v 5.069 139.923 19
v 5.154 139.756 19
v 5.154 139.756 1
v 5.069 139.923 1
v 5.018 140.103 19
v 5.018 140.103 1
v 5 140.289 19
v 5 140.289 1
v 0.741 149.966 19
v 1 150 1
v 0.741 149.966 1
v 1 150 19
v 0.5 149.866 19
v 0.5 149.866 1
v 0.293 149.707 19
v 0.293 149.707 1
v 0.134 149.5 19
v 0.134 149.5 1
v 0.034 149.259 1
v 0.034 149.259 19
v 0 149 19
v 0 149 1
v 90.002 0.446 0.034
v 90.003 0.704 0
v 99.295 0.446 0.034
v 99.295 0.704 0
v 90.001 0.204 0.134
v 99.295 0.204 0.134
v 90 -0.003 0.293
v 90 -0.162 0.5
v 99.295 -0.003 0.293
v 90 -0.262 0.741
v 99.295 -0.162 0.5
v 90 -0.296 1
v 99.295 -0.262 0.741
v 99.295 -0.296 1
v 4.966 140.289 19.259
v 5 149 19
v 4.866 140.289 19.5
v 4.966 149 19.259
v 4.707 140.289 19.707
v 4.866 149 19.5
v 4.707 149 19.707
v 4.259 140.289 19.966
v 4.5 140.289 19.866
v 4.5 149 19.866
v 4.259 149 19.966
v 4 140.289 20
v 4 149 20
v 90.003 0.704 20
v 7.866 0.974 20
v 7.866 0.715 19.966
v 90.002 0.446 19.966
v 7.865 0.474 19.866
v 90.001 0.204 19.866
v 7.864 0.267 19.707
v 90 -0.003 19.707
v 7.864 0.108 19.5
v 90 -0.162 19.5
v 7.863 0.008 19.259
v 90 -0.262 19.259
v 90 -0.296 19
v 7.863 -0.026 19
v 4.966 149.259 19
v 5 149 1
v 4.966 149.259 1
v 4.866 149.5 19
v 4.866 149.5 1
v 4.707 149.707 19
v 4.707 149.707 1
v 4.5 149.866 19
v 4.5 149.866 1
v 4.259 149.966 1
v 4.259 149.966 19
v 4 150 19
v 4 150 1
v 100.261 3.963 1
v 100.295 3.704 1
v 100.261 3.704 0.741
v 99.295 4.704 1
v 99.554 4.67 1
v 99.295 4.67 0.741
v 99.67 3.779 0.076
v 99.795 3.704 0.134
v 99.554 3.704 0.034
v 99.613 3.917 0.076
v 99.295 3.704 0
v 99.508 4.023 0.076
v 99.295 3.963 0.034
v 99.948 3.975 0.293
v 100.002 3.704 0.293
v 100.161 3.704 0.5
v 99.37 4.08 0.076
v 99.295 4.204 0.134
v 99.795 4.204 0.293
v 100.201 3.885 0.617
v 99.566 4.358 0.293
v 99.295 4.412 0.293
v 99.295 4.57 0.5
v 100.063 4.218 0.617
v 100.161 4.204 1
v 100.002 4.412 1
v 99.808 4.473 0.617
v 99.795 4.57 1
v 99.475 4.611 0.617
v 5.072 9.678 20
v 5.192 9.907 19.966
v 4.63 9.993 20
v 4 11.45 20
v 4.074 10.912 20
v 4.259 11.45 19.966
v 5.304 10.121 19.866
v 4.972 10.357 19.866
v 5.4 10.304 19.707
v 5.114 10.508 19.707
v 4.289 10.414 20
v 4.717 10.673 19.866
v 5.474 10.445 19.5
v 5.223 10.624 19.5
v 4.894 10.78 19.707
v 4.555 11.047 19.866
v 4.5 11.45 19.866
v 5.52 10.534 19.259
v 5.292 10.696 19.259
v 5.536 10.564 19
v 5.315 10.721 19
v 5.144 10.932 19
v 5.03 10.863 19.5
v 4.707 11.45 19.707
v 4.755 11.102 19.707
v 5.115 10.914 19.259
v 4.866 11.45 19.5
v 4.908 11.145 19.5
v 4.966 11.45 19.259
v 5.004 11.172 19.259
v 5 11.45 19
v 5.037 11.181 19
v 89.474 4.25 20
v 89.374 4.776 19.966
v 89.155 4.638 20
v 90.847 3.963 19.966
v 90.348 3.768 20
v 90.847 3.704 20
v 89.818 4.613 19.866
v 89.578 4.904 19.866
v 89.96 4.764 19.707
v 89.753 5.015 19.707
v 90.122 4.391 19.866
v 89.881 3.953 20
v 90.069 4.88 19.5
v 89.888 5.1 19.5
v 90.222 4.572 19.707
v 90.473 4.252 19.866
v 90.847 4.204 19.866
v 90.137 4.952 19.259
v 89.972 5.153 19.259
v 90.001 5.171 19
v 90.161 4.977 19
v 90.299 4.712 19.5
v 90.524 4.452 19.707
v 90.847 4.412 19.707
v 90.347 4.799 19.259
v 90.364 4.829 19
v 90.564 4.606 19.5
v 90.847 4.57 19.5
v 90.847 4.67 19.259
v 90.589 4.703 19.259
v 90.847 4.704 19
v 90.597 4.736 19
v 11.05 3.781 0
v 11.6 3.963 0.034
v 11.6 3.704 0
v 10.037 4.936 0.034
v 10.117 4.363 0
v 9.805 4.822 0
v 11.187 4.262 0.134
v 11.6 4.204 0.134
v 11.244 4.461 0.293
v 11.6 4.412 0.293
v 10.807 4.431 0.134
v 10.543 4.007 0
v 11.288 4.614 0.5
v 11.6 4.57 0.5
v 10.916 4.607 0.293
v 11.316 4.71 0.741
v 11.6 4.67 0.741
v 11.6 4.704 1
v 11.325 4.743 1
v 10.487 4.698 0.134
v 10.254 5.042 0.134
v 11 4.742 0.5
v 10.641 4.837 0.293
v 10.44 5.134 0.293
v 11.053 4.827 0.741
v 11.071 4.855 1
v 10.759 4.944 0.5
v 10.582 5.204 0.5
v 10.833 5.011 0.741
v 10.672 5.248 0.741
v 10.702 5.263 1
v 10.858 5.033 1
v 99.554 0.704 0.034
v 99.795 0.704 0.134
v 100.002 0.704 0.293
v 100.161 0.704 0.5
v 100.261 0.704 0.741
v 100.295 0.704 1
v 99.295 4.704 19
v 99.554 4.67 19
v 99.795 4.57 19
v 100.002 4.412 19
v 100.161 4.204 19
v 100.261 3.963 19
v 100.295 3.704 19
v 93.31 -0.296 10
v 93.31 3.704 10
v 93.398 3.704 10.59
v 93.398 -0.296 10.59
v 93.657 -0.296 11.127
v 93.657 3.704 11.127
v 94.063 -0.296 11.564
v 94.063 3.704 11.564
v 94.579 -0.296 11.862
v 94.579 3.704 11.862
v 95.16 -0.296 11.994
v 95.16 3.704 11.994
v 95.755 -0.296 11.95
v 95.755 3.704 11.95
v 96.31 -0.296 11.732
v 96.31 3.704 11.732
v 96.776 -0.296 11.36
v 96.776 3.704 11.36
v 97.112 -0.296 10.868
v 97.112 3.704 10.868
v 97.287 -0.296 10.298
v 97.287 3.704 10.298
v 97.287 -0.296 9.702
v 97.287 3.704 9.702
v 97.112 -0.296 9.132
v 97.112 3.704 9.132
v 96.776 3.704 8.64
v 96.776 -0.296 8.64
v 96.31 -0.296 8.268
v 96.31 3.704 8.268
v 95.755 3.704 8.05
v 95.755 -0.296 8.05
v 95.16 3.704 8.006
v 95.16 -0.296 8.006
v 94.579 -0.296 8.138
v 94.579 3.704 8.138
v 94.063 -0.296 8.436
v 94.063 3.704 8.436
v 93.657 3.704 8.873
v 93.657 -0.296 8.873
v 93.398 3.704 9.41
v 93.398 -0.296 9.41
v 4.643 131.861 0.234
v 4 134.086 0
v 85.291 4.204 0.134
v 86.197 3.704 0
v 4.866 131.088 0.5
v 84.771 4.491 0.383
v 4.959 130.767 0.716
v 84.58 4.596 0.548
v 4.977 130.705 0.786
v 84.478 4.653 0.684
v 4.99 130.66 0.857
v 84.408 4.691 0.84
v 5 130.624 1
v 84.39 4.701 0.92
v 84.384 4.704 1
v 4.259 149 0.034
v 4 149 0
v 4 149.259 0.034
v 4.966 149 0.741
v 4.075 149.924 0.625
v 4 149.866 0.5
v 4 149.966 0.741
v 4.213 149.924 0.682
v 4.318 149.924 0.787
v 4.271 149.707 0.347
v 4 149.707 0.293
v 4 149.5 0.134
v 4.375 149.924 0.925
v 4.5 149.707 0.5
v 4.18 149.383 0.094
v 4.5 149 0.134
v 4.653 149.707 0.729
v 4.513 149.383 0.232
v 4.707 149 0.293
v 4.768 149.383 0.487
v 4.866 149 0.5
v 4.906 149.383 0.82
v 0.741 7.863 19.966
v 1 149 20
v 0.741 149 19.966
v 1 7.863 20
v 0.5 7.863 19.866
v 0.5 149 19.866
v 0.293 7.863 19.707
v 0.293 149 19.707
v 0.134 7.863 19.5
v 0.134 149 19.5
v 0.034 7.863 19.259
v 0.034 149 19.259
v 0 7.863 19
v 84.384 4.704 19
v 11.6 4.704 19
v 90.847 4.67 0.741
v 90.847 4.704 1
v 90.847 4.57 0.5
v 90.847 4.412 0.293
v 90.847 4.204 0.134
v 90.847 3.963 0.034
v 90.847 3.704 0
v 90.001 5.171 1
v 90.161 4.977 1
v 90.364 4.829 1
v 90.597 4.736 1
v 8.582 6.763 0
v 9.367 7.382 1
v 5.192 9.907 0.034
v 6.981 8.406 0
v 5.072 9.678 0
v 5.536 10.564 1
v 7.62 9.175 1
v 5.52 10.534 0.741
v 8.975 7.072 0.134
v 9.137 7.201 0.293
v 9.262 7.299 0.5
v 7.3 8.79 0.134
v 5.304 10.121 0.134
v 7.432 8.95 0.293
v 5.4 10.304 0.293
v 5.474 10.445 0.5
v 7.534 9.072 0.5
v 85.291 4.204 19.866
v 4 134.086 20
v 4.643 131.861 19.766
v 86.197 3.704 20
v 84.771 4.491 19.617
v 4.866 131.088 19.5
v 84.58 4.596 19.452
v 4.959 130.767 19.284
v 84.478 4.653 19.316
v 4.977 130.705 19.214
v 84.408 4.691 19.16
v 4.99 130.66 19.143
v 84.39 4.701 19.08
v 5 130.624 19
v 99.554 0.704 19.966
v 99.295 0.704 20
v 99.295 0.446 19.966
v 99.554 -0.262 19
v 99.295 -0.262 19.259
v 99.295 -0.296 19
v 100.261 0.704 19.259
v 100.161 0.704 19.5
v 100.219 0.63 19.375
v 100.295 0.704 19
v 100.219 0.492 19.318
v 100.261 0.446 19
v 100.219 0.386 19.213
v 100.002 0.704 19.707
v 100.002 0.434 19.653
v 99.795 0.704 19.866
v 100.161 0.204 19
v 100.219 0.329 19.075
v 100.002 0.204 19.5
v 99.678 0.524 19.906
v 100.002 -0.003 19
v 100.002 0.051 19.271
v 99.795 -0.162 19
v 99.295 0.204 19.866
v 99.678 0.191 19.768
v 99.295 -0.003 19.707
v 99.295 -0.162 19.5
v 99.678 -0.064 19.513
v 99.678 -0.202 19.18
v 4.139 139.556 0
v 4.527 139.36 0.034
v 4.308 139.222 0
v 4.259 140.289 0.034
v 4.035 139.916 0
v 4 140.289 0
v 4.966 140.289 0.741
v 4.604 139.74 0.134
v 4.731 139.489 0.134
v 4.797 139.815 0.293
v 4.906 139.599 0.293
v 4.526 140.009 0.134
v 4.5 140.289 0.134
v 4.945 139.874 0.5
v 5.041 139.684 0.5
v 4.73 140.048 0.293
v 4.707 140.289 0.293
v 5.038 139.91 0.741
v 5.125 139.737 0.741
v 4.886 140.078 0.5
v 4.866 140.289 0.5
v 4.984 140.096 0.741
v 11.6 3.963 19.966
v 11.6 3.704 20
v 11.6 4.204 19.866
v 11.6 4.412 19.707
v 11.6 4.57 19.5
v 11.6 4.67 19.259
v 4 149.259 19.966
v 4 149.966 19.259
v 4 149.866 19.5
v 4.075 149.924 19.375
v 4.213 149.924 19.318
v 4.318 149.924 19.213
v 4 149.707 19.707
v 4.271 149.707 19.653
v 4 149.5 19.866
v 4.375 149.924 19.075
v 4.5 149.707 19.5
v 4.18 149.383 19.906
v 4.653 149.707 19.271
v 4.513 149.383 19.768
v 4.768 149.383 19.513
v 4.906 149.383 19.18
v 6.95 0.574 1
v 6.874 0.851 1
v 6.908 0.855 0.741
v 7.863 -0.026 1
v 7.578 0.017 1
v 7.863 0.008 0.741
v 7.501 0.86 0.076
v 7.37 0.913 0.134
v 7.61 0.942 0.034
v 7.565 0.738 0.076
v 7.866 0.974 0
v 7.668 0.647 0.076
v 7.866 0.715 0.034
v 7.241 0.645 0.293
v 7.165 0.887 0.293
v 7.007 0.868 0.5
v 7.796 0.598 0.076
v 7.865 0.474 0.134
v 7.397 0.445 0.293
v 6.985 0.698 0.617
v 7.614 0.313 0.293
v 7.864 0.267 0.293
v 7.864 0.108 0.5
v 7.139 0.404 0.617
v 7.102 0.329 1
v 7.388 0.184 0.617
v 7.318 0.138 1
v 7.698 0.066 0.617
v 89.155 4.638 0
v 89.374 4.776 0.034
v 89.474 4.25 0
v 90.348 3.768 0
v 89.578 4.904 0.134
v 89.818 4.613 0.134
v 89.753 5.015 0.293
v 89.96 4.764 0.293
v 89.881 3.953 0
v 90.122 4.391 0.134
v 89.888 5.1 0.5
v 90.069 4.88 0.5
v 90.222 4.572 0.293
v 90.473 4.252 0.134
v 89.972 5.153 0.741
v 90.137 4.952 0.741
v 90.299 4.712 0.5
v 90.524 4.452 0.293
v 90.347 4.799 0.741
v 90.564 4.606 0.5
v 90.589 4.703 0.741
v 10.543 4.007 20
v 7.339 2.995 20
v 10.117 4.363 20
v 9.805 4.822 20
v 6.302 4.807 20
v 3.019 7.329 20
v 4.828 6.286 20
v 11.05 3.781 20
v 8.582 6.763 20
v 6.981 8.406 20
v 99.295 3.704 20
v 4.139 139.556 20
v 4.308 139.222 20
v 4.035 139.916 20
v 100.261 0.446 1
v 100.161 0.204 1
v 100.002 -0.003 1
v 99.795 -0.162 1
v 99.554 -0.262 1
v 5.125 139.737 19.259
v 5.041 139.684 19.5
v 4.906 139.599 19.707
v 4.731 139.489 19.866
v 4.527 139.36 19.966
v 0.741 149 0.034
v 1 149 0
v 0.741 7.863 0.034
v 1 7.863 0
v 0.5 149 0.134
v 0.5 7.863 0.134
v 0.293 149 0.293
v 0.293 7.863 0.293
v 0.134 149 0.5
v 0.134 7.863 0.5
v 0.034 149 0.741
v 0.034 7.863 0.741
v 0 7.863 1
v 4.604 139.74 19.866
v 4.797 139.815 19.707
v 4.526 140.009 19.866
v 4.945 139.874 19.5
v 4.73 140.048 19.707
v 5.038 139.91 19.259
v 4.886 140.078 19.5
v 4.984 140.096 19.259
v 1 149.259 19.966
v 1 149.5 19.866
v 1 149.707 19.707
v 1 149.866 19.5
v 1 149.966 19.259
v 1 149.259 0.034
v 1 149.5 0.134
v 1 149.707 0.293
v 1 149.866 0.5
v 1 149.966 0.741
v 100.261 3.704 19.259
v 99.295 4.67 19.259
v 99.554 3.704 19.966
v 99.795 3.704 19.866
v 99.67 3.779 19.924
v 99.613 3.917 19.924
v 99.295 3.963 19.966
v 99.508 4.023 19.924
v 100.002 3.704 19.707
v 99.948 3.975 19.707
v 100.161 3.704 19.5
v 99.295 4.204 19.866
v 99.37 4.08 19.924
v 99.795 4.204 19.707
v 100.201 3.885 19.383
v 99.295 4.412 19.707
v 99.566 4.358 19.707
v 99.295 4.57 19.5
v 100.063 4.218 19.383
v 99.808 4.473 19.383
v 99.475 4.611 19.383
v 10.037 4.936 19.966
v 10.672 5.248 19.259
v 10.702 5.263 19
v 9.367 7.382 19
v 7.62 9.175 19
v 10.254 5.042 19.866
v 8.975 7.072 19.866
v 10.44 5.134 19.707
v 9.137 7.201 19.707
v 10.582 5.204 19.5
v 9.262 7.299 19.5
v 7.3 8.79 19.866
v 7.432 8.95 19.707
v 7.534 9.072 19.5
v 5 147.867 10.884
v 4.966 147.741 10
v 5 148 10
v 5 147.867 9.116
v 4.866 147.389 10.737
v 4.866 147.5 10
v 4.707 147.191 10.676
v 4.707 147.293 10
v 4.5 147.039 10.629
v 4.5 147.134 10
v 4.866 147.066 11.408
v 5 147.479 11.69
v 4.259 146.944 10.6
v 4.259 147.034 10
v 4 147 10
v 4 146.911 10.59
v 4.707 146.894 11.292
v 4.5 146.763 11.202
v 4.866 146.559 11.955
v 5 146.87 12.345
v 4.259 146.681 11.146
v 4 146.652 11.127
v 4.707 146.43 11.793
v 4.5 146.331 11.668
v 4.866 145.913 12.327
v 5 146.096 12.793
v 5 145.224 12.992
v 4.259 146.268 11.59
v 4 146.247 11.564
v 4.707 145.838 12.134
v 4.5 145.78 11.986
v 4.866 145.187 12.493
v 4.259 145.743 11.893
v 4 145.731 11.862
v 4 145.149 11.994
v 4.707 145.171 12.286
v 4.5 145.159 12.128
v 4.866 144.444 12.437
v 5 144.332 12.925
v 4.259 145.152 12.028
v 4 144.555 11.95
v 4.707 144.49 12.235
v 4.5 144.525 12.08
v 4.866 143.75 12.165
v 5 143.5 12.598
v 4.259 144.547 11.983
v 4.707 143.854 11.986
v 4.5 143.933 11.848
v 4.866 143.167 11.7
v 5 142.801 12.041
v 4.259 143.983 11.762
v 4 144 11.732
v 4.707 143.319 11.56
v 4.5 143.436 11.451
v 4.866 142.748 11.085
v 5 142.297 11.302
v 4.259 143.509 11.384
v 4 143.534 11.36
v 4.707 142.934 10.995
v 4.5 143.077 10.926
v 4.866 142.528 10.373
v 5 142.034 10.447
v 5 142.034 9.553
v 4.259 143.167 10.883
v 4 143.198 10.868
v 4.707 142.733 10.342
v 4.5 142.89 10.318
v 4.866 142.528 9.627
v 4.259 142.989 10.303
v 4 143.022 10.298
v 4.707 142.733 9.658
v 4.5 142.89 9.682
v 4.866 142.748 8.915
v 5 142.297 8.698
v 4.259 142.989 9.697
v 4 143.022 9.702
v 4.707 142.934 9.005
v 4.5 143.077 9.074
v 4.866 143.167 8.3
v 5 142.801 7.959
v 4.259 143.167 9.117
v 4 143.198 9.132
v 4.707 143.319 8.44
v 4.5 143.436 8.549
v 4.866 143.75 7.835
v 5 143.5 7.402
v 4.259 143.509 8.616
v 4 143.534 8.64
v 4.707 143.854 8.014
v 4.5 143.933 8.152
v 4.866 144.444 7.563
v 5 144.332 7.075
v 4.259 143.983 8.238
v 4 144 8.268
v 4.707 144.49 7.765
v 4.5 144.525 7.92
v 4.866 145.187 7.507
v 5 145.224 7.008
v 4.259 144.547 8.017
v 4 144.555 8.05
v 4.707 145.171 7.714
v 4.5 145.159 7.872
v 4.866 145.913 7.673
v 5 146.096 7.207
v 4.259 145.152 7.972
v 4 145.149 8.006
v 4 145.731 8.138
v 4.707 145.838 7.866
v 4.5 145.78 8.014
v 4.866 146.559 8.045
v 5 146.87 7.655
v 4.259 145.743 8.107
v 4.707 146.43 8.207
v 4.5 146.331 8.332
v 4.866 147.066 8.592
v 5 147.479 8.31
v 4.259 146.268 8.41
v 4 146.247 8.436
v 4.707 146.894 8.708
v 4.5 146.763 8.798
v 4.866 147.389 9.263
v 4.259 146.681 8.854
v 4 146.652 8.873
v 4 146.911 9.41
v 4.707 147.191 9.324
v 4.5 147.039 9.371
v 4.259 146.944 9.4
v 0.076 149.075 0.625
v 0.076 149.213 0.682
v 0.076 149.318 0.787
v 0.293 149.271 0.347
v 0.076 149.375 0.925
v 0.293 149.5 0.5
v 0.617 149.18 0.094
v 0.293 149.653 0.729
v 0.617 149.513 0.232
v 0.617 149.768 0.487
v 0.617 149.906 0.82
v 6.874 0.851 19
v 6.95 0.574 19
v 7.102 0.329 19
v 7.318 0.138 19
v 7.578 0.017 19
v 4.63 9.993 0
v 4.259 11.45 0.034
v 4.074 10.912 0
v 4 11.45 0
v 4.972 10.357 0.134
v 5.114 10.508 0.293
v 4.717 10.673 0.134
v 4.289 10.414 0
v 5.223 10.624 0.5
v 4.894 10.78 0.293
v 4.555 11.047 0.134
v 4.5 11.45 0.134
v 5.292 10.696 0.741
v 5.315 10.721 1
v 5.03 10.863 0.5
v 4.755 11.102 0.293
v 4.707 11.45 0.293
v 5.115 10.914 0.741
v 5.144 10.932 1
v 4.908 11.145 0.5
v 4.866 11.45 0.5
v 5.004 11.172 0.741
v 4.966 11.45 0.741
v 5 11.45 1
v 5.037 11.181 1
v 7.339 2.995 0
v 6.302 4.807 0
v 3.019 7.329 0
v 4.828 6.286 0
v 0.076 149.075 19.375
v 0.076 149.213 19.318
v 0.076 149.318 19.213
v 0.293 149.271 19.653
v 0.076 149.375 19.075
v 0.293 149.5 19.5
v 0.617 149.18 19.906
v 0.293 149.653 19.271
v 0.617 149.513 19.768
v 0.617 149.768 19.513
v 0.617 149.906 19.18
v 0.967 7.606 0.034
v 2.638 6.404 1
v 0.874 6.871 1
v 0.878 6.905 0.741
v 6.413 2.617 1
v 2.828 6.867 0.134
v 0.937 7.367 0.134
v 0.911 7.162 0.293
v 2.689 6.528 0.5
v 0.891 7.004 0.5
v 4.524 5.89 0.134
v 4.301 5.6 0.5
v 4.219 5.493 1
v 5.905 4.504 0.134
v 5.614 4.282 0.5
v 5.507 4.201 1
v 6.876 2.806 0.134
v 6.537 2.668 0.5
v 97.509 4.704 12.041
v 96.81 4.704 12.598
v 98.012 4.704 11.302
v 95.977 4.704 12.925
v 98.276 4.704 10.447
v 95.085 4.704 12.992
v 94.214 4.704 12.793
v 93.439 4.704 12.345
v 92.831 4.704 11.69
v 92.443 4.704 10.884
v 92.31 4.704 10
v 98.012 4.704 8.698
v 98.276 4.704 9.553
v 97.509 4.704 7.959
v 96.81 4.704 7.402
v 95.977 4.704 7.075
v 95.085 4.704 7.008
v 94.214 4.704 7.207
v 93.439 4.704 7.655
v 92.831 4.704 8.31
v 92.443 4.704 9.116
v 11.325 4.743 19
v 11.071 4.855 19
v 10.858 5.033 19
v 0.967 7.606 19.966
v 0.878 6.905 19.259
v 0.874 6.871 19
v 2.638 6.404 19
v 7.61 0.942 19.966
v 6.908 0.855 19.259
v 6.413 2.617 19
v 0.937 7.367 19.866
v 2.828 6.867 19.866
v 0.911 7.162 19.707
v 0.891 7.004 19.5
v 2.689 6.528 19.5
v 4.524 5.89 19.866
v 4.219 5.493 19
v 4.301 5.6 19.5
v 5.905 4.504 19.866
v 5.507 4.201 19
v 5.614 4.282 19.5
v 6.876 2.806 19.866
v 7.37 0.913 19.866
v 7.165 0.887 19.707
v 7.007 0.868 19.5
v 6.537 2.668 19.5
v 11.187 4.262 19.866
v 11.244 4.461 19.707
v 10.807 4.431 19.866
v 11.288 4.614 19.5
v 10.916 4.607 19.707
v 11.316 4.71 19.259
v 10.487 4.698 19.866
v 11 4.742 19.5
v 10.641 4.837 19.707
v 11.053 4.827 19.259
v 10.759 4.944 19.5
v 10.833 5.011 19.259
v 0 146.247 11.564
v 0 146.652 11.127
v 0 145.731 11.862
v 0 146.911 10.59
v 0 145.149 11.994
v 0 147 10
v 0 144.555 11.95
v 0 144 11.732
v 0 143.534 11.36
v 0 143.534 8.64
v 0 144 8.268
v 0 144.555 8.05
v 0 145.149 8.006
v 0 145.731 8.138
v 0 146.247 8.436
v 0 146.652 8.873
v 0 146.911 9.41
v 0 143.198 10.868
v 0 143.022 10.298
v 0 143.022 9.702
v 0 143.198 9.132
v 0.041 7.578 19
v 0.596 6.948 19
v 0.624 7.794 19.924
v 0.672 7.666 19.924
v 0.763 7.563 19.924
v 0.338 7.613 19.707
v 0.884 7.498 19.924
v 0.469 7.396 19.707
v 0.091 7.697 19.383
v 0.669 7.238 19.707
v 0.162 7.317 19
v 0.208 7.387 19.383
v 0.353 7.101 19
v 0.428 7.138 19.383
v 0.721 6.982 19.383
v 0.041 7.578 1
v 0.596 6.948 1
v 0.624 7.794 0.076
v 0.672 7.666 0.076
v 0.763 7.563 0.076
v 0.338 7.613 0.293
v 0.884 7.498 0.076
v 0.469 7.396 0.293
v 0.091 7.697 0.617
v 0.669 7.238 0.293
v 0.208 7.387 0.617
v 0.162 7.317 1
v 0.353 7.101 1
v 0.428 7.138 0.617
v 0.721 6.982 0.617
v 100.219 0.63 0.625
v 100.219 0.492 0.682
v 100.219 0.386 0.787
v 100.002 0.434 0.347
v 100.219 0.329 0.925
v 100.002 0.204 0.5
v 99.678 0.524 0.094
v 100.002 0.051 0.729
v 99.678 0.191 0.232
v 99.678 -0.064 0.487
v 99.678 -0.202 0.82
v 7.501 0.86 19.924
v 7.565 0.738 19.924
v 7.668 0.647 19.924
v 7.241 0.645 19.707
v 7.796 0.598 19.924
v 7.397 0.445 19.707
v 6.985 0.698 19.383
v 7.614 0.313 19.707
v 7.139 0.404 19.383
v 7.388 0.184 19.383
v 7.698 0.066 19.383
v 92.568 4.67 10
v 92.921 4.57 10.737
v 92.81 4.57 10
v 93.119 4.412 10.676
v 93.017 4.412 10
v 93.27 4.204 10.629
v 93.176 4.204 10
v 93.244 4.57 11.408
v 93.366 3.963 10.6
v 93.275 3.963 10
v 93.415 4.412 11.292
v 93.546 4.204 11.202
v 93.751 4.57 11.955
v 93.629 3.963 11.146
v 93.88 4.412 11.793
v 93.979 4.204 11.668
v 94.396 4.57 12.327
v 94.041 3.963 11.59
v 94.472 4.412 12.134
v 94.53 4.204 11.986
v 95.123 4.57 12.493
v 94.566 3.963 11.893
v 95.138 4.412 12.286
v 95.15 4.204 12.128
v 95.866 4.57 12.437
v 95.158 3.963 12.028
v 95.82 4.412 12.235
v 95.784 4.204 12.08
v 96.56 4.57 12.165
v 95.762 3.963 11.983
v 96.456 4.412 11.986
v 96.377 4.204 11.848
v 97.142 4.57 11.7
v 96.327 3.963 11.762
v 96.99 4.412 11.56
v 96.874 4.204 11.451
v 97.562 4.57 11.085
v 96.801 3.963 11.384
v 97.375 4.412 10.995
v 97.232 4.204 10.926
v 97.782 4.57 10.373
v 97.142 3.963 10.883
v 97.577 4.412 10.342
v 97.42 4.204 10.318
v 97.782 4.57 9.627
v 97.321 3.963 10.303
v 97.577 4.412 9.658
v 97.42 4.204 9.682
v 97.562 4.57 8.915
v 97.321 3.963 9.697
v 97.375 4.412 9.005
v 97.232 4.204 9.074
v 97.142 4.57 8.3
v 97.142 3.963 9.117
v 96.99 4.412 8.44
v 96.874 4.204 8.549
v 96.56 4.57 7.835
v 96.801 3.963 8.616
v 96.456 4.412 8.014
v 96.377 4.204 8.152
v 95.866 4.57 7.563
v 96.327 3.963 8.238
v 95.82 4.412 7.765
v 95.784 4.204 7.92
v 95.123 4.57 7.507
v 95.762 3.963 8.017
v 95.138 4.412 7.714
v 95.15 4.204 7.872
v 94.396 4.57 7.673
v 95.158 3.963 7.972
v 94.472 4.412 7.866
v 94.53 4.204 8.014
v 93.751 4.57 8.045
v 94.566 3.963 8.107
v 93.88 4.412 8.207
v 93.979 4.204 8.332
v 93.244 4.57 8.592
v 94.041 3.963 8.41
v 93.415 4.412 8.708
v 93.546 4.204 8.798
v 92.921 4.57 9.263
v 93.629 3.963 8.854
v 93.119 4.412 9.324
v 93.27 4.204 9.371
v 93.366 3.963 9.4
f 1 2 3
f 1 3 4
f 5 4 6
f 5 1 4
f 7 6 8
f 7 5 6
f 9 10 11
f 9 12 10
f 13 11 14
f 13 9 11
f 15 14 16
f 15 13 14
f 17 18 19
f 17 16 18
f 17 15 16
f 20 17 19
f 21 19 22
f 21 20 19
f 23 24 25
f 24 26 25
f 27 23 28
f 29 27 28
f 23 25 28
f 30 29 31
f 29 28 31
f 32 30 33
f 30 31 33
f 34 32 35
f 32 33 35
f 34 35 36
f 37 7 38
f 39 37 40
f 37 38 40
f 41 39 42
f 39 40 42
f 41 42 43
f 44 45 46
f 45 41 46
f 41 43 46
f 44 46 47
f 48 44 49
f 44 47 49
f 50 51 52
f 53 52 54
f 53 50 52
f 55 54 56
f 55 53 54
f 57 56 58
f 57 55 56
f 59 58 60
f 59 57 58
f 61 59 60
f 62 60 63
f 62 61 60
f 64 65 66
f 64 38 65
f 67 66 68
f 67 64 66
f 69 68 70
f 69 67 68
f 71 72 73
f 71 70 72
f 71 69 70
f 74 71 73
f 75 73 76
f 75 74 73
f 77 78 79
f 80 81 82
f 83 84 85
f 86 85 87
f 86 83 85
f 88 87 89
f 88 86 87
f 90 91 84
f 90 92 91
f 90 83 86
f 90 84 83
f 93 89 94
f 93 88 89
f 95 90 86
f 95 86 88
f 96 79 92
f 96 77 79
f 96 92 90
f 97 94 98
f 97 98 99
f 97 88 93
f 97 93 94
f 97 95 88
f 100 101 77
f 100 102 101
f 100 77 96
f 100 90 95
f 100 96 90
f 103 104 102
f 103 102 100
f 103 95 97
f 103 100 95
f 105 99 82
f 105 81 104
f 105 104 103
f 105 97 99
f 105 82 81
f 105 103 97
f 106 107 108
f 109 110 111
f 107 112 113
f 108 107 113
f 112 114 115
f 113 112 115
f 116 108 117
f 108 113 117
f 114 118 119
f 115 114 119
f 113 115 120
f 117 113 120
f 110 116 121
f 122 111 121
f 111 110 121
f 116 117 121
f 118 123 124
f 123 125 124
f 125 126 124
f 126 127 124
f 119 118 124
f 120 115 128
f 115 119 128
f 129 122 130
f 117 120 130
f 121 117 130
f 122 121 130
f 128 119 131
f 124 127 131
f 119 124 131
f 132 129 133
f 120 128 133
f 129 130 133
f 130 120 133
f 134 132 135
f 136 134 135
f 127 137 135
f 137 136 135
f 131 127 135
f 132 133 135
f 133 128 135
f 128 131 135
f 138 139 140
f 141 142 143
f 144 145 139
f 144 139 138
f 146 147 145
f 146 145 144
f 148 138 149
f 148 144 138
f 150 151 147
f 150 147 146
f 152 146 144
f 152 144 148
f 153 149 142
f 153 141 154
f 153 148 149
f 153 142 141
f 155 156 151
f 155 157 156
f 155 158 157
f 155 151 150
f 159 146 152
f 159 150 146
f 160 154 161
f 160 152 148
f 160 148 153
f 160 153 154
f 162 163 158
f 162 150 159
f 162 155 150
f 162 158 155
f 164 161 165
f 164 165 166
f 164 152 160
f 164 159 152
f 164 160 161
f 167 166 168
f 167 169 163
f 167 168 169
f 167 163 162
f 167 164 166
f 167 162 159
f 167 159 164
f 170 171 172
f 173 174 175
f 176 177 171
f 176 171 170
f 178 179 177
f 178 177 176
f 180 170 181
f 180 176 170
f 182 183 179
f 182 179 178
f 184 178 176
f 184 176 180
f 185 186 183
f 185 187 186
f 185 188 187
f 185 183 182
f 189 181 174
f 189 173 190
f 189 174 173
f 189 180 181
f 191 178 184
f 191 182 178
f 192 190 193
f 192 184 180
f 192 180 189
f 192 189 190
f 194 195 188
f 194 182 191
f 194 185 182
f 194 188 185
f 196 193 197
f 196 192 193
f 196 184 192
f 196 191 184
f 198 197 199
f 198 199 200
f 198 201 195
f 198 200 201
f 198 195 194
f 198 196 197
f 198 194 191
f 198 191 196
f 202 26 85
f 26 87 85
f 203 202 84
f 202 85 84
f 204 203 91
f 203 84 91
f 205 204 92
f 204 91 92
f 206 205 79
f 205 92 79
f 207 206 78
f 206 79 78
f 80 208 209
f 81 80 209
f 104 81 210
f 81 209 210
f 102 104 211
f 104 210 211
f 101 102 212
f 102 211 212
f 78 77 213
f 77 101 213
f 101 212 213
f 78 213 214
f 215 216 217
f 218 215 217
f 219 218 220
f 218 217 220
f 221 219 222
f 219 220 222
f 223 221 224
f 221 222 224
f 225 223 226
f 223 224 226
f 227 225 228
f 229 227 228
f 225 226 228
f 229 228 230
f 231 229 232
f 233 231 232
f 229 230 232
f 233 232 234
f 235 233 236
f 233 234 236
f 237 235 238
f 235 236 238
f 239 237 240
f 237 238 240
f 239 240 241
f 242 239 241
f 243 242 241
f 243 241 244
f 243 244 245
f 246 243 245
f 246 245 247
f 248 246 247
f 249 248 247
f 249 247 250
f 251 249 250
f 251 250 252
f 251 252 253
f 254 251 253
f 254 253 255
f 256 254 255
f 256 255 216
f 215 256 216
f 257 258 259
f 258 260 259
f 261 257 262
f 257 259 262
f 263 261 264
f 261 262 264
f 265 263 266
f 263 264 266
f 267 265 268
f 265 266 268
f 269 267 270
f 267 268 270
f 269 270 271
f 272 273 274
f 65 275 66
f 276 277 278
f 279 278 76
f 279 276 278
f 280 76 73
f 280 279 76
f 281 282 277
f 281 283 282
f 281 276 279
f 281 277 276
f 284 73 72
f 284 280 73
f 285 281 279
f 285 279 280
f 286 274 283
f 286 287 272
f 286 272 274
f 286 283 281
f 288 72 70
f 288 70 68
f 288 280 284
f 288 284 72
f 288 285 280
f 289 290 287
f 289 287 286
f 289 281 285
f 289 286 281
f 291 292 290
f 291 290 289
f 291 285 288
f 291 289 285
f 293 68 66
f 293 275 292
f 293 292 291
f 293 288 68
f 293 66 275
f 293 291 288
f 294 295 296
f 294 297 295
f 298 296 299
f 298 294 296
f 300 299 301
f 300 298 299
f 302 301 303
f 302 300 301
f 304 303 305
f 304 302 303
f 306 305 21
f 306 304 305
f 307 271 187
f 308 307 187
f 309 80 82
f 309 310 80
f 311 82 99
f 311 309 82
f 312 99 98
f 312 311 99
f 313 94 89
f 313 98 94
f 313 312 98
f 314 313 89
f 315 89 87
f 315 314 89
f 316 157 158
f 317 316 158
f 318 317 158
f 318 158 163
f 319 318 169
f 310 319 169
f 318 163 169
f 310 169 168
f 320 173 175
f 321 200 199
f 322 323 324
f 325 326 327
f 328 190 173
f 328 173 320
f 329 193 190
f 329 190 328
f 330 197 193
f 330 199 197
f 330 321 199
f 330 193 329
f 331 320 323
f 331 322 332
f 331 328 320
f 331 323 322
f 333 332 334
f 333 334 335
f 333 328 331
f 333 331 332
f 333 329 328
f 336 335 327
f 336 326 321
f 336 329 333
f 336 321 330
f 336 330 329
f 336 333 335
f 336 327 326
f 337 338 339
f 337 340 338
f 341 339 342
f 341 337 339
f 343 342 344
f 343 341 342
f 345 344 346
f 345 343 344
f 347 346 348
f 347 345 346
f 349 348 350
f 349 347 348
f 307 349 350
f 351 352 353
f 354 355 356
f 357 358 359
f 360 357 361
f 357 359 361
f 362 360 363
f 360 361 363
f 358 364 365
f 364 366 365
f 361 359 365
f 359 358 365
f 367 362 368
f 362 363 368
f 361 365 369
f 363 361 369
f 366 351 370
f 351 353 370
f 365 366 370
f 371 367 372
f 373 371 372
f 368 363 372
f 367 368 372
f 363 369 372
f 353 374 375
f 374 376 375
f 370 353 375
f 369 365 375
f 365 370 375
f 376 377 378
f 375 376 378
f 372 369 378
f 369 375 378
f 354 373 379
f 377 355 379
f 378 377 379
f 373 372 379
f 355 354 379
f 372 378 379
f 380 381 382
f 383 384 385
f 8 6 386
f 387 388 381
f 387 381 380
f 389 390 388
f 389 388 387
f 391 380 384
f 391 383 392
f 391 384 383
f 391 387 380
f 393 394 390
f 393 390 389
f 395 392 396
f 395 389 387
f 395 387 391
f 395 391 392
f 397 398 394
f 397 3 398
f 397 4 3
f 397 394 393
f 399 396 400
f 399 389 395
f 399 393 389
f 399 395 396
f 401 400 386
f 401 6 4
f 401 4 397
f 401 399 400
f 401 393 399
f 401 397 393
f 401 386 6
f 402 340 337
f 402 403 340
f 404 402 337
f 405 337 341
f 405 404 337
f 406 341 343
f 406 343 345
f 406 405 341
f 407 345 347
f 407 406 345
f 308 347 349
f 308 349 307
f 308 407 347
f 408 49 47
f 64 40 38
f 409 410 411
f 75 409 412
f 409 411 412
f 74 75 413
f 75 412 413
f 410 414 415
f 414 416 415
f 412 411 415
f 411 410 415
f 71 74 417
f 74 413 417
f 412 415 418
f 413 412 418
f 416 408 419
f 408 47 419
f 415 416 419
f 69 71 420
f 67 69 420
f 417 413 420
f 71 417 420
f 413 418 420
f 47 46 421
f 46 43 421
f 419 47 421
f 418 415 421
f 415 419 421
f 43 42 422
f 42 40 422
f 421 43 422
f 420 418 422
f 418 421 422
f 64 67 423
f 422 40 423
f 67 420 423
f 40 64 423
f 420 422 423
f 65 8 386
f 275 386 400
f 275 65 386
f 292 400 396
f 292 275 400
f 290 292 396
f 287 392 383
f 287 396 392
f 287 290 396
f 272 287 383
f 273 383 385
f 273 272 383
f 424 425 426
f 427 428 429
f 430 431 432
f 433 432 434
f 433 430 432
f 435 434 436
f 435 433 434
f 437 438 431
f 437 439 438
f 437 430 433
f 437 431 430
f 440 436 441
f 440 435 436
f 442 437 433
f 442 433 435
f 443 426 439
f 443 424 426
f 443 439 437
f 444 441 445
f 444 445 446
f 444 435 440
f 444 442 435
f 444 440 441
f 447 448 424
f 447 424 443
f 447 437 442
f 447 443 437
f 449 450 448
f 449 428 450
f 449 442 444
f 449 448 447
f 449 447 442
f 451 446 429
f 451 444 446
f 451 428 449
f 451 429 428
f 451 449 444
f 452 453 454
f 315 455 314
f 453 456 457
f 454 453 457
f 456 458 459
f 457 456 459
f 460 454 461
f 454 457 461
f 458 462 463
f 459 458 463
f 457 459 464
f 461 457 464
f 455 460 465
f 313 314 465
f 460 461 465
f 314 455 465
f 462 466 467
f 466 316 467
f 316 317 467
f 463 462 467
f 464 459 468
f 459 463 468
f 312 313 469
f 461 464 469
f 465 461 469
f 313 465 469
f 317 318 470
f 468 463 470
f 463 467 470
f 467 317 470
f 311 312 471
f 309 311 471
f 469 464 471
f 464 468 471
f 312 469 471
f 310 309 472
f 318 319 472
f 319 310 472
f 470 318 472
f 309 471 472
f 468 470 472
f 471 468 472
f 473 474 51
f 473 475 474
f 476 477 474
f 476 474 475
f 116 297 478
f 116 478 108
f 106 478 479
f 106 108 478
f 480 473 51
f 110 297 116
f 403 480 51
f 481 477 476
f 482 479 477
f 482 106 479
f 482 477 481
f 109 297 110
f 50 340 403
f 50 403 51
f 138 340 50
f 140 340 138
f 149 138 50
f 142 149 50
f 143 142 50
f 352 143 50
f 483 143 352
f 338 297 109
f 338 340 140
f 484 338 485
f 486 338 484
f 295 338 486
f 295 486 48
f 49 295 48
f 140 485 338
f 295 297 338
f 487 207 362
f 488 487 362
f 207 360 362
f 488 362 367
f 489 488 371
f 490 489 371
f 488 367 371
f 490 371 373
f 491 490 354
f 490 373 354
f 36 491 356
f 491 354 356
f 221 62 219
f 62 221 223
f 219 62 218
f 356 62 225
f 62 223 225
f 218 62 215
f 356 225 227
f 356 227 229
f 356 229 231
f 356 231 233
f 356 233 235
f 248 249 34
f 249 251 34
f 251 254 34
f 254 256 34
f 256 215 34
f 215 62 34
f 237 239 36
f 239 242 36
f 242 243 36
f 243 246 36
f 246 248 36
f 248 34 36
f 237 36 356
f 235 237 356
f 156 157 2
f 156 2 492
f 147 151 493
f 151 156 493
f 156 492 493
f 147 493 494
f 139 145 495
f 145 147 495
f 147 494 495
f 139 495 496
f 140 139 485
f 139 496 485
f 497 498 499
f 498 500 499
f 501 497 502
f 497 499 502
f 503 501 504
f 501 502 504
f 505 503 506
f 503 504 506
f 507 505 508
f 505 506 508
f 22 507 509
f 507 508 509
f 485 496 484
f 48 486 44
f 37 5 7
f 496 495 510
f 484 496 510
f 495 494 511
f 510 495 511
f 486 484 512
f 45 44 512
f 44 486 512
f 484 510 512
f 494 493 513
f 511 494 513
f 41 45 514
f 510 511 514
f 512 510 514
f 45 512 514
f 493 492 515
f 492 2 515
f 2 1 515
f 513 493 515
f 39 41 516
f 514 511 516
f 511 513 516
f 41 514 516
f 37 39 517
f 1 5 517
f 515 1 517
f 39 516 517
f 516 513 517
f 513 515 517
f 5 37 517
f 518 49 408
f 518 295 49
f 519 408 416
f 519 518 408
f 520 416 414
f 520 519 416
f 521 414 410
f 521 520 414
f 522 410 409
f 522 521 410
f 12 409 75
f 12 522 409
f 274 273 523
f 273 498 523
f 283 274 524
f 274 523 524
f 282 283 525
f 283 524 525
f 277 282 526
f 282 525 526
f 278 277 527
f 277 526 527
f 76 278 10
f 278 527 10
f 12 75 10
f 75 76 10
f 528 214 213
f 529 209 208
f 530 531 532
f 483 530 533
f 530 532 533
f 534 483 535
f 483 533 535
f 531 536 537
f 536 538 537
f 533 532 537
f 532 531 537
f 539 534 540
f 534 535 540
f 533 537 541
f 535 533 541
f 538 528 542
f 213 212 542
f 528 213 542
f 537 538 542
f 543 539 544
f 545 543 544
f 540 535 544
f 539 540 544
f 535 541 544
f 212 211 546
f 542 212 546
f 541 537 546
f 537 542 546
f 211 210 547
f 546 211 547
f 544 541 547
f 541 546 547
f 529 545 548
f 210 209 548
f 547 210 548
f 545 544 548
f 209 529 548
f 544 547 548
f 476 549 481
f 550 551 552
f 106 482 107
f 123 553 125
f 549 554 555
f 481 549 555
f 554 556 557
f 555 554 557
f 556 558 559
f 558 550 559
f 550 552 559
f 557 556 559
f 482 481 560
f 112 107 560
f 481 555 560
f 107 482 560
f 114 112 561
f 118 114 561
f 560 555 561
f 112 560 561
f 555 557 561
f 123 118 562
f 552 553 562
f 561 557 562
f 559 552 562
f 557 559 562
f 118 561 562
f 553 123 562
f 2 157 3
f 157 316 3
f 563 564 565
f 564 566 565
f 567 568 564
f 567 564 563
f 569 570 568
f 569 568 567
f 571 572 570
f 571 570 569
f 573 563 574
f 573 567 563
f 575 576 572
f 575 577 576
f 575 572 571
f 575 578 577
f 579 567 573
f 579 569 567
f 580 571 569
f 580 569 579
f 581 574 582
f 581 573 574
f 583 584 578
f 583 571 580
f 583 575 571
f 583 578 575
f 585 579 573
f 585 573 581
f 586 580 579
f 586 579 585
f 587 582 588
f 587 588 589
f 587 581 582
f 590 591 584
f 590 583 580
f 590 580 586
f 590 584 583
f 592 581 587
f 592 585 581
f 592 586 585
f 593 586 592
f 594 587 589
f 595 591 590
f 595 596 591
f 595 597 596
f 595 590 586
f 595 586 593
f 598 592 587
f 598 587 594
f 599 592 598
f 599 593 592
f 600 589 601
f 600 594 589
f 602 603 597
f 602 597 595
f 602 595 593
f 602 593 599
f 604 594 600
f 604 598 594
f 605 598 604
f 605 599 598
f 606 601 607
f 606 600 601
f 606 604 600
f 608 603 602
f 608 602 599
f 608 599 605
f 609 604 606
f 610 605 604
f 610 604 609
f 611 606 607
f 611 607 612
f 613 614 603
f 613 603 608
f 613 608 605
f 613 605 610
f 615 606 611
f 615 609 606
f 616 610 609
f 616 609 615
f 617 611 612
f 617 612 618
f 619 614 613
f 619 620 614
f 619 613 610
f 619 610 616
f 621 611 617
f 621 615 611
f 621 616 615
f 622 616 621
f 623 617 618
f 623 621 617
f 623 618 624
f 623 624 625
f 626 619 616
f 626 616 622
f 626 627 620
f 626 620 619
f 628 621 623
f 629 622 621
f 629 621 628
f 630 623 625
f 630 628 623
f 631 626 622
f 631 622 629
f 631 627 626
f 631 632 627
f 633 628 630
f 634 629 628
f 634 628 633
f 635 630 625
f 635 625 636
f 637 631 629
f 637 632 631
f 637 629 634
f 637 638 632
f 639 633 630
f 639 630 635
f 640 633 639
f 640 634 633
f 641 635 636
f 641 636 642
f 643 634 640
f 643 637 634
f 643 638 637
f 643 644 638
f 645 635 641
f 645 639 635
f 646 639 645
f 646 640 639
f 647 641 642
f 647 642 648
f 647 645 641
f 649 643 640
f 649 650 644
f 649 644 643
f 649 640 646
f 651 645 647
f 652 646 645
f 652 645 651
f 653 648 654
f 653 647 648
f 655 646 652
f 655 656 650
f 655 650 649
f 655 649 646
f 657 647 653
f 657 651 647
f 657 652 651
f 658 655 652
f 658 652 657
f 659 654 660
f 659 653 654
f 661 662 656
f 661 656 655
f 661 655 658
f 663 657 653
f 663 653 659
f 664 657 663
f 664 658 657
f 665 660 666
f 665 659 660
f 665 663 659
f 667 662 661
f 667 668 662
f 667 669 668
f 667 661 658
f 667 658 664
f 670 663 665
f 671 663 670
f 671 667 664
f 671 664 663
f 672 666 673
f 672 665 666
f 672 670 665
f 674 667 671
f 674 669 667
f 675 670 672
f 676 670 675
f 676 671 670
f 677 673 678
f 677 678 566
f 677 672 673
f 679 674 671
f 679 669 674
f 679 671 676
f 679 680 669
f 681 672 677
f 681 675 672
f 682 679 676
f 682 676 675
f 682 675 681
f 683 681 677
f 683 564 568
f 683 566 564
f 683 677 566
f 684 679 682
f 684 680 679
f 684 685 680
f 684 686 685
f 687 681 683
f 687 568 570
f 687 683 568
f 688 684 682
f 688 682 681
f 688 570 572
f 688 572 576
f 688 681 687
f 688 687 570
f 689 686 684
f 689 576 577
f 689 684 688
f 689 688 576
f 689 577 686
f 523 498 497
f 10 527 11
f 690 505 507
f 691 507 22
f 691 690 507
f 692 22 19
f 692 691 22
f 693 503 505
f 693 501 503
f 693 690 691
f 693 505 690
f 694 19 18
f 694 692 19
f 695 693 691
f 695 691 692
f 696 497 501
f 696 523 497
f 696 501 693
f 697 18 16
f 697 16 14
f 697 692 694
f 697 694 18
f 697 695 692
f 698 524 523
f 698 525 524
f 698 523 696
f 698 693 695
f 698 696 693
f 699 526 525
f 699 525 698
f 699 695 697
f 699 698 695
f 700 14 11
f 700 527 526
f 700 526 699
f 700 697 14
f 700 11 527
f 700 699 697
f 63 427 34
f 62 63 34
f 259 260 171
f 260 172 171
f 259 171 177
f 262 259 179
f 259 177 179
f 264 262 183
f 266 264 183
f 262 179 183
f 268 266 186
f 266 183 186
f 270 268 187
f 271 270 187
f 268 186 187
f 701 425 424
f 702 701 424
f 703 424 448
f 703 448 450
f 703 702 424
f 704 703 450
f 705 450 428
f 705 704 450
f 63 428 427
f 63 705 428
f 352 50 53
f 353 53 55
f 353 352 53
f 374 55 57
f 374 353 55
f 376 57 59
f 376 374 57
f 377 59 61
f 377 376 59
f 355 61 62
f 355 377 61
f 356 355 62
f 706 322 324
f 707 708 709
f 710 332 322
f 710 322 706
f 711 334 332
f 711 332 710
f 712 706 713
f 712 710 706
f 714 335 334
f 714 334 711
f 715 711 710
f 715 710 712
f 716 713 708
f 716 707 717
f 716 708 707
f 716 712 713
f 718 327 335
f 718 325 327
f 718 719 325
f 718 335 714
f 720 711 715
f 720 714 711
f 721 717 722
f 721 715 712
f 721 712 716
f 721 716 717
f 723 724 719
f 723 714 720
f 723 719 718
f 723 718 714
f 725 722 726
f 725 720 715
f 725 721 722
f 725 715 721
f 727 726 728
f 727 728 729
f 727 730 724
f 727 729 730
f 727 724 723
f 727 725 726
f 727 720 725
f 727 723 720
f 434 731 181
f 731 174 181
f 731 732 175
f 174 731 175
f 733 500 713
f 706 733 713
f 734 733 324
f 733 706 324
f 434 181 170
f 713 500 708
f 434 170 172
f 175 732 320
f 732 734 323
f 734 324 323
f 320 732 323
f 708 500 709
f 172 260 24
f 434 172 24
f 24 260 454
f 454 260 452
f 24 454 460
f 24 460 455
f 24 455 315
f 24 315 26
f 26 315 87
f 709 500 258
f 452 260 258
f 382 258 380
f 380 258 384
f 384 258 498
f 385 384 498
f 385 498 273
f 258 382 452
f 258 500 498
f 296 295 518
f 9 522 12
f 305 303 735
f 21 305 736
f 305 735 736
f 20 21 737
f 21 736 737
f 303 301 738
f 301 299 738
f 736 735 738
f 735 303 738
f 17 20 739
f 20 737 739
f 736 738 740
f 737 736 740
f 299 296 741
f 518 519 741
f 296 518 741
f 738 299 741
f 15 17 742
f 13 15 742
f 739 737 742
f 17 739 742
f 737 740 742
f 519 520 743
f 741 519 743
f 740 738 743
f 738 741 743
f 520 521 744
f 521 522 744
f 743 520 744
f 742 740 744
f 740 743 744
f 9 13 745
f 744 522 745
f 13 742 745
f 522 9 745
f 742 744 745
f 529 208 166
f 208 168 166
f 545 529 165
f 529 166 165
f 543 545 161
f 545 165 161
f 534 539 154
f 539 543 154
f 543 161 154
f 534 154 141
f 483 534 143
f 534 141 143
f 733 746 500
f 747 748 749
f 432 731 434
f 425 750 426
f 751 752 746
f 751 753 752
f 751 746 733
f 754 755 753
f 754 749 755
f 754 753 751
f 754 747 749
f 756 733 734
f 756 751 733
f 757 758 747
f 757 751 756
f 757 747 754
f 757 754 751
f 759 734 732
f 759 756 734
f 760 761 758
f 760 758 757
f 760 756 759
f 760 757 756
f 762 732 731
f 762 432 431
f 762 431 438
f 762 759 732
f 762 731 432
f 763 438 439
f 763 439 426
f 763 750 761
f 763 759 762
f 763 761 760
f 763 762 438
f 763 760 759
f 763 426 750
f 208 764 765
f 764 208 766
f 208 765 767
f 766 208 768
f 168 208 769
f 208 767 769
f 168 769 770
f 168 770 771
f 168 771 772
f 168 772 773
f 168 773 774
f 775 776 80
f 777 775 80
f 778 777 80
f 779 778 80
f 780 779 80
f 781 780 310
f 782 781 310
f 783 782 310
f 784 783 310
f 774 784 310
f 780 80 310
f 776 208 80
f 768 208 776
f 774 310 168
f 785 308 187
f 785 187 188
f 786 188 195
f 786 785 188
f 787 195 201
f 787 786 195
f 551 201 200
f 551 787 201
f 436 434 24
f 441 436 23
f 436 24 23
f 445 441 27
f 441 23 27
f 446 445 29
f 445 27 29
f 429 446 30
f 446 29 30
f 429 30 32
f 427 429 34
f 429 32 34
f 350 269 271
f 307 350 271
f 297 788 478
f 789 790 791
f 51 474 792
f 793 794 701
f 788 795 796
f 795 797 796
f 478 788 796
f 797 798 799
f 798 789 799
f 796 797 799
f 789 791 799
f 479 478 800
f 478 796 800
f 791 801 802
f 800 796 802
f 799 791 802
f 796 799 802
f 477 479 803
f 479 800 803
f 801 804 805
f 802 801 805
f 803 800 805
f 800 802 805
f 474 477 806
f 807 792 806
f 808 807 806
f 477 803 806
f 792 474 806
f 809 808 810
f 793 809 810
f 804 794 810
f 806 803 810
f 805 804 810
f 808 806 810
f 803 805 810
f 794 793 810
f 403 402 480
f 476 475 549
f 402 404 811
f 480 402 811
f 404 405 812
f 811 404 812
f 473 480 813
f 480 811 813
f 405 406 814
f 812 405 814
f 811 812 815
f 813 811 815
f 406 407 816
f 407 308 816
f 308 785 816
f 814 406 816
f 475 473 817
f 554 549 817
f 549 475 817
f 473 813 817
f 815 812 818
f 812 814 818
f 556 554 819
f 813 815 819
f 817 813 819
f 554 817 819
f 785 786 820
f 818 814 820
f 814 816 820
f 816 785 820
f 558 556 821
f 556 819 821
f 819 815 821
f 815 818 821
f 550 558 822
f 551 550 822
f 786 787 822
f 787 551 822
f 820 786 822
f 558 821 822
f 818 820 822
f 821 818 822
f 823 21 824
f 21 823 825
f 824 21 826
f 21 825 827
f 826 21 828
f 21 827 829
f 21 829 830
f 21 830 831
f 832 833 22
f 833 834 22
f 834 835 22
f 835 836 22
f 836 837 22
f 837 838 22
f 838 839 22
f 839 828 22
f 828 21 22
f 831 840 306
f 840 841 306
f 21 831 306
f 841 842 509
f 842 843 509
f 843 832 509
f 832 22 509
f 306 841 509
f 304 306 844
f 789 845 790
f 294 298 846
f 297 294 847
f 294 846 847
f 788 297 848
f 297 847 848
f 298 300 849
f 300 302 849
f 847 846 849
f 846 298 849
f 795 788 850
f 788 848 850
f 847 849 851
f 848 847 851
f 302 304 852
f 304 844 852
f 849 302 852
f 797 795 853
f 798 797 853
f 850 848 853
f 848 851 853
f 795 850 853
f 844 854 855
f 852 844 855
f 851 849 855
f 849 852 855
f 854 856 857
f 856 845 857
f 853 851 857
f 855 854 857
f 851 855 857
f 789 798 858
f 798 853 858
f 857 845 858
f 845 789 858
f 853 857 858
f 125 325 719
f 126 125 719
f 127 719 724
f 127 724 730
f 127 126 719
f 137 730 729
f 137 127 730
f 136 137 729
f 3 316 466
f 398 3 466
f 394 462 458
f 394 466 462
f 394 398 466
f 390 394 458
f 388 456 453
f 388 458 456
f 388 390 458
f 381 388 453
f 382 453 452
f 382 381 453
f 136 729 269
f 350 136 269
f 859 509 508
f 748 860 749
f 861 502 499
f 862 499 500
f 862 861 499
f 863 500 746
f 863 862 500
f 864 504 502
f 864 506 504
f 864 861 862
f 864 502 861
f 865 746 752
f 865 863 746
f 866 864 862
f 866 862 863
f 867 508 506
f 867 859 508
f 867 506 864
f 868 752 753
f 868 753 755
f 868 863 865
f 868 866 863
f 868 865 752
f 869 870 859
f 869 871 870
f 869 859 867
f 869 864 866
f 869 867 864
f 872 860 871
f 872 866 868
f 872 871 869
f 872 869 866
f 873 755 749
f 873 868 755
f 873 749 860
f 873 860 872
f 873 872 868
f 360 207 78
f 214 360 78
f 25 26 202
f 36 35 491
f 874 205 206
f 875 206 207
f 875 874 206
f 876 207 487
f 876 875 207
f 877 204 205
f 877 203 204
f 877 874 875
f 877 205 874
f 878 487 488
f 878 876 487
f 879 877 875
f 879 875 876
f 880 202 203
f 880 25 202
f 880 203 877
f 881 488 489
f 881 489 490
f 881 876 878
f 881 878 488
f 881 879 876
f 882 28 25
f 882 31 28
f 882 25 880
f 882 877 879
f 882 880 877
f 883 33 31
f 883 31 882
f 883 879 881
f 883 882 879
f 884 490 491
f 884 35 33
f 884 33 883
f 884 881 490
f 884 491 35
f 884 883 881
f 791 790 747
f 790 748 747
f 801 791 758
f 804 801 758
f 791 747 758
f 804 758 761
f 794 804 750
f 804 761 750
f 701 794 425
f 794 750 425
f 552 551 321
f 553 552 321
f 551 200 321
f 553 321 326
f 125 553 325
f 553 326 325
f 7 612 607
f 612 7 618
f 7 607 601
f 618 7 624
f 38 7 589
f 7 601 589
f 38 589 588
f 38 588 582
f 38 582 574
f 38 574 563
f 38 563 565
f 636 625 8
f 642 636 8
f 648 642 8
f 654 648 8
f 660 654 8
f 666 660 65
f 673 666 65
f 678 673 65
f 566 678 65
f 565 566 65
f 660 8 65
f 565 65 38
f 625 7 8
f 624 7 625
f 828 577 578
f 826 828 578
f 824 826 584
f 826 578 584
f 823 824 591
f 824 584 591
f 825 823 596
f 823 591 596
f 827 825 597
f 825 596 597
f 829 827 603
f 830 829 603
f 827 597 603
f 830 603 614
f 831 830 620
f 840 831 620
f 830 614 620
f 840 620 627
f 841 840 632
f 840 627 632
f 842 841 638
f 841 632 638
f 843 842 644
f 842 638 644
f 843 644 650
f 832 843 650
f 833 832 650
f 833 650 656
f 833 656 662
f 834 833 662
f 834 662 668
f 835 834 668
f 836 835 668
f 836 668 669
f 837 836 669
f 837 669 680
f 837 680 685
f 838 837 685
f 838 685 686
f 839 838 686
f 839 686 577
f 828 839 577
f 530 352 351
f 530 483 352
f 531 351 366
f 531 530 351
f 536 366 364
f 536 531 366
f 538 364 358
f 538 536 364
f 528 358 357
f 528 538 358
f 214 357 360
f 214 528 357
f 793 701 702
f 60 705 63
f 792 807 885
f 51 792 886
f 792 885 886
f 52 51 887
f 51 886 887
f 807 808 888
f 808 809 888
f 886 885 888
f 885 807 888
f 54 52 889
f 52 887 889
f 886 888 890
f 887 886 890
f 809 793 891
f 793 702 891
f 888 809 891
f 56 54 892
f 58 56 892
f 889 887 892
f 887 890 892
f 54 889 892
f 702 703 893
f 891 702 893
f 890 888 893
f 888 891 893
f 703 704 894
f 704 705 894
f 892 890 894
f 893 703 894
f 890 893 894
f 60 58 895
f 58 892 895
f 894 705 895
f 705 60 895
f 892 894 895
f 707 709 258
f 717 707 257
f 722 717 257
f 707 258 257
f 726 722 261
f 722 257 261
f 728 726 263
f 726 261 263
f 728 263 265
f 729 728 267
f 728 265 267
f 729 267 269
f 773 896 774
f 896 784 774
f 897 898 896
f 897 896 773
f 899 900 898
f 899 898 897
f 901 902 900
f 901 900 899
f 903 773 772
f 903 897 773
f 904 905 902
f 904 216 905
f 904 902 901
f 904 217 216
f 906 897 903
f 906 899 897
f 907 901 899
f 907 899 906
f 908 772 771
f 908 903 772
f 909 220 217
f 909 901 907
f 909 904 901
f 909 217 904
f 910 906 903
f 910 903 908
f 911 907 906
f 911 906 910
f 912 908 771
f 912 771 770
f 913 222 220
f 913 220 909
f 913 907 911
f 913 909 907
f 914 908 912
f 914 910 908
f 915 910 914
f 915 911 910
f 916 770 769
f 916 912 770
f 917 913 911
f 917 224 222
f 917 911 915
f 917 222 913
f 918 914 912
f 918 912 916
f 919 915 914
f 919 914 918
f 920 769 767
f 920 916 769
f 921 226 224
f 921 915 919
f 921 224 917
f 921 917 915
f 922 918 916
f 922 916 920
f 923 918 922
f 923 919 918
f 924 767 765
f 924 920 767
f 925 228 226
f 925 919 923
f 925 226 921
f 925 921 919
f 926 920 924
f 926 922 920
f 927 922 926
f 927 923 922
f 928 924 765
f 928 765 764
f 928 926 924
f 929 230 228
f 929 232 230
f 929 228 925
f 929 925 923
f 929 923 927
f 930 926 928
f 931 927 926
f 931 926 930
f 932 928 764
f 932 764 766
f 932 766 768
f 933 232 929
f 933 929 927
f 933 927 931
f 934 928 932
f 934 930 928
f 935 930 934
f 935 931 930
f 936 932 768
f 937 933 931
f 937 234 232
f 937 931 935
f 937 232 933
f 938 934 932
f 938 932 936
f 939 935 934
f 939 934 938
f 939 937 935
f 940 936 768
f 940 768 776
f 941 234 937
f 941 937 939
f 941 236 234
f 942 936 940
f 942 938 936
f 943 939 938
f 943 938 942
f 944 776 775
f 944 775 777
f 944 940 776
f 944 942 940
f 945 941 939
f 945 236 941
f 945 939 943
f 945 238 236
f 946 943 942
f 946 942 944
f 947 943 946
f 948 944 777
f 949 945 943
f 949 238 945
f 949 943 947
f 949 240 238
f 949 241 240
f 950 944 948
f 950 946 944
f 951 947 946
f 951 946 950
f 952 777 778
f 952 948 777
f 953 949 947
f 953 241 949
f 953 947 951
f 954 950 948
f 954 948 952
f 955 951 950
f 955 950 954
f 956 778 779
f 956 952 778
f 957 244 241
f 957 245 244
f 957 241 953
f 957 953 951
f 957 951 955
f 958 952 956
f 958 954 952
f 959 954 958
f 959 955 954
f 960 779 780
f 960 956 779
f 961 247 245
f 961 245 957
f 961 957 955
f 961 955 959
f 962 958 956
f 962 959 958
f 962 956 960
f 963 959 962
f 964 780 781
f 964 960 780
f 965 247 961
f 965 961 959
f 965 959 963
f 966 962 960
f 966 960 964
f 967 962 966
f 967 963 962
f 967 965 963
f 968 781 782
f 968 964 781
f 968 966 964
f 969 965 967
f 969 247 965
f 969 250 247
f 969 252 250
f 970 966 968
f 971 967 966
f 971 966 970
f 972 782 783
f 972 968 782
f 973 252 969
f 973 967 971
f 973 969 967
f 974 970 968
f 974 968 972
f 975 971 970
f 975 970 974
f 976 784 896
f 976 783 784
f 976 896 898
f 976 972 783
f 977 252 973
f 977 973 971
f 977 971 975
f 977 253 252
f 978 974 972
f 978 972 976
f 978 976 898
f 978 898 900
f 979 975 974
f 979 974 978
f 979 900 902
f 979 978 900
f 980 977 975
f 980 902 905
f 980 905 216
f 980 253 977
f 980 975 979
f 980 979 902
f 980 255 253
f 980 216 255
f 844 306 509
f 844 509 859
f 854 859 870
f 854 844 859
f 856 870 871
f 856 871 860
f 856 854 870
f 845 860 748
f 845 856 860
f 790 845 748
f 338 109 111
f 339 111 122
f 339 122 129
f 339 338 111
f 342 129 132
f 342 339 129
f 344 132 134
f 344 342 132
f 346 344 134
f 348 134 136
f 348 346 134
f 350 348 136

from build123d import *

# Parameters (mm, degrees)
F1_DEPTH = 20
F2_R     = 2
F3_DEPTH = 25
F4_R     = 2
F5_DEPTH = 25
F6_R     = 1


# Not quite as in the source:
# - a feature names something its author has since deleted; it is built from what else it names


with BuildPart() as f1:
    # F0 (on Top) → F1 (new body)
    with BuildSketch(Plane.XY):
        Polygon((84.3844267085, 4.7044013627), (90.2951131996, 4.7044013627), (5, 140), (5, 130.6244351268), align=None)
        with BuildLine():
            Line((100.2951131996, 4.7044013627), (90.2951131996, 4.7044013627))
            Line((90.2951131996, 4.7044013627), (84.3844267085, 4.7044013627))
            Line((84.3844267085, 4.7044013627), (10.95945259, 4.7044013627))
            ThreePointArc((10.95945259, 4.7044013627), (8.5469291421, 8.3181124958), (5, 10.8277880129))
            Line((5, 10.8277880129), (5, 130.6244351268))
            Line((5, 130.6244351268), (5, 140))
            Line((5, 140), (5, 150))
            Line((5, 150), (0, 150))
            Line((0, 150), (0, 6.9264828534))
            ThreePointArc((0, 6.9264828534), (4.9057995801, 4.8897132021), (6.9264454937, -0.0227495433))
            Line((6.9264454937, -0.0227495433), (89.9995145623, -0.2955986373))
            Line((89.9995145623, -0.2955986373), (100.2951131996, -0.2955986373))
            Line((100.2951131996, -0.2955986373), (100.2951131996, 4.7044013627))
        make_face()
    extrude(amount=F1_DEPTH)

    # F2 (on face) → F3 (cut)
    with BuildSketch(Plane.YZ.offset(5)):
        with Locations((145, 10)):
            Circle(F2_R)
    extrude(amount=-F3_DEPTH, mode=Mode.SUBTRACT)

    # F4 (on face) → F5 (cut)
    with BuildSketch(Plane(origin=(0, 4.7044013627, 0), x_dir=(-1, 0, 0), z_dir=(0, 1, 0))):
        with Locations((-95.3095704317, 10)):
            Circle(F4_R)
    extrude(amount=-F5_DEPTH, mode=Mode.SUBTRACT)

    # F6
    f6_edges = [f1.edges().sort_by_distance(p)[0] for p in [
        (100.295113, 4.704401, 10),
        (47.647557, 72.352201, 20),
        (5, 145, 20),
        (2.5, 150, 20),
        (0, 78.463241, 20),
        (4.9058, 4.889713, 20),
        (48.46298, -0.159174, 20),
        (95.147314, -0.295599, 20),
        (100.295113, 2.204401, 20),
        (95.295113, 4.704401, 20),
        (44.692213, 67.664418, 20),
        (47.67194, 4.704401, 20),
        (8.546929, 8.318112, 20),
        (5, 70.726112, 20),
        (47.647557, 72.352201, 0),
        (5, 145, 0),
        (2.5, 150, 0),
        (0, 78.463241, 0),
        (4.9058, 4.889713, 0),
        (48.46298, -0.159174, 0),
        (95.147314, -0.295599, 0),
        (100.295113, 2.204401, 0),
        (95.295113, 4.704401, 0),
        (44.692213, 67.664418, 0),
        (47.67194, 4.704401, 0),
        (8.546929, 8.318112, 0),
        (5, 70.726112, 0),
        (5, 143, 10),
        (97.30957, 4.704401, 10),
        (90.295113, 4.704401, 10),
        (5, 140, 10),
        (5, 150, 10),
        (6.926445, -0.02275, 10),
        (0, 6.926483, 10),
        (5, 10.827788, 10),
        (10.959453, 4.704401, 10),
        (100.295113, -0.295599, 10),
        (0, 150, 10),
    ]]
    fillet(f6_edges, radius=F6_R)


solid = f1.part
